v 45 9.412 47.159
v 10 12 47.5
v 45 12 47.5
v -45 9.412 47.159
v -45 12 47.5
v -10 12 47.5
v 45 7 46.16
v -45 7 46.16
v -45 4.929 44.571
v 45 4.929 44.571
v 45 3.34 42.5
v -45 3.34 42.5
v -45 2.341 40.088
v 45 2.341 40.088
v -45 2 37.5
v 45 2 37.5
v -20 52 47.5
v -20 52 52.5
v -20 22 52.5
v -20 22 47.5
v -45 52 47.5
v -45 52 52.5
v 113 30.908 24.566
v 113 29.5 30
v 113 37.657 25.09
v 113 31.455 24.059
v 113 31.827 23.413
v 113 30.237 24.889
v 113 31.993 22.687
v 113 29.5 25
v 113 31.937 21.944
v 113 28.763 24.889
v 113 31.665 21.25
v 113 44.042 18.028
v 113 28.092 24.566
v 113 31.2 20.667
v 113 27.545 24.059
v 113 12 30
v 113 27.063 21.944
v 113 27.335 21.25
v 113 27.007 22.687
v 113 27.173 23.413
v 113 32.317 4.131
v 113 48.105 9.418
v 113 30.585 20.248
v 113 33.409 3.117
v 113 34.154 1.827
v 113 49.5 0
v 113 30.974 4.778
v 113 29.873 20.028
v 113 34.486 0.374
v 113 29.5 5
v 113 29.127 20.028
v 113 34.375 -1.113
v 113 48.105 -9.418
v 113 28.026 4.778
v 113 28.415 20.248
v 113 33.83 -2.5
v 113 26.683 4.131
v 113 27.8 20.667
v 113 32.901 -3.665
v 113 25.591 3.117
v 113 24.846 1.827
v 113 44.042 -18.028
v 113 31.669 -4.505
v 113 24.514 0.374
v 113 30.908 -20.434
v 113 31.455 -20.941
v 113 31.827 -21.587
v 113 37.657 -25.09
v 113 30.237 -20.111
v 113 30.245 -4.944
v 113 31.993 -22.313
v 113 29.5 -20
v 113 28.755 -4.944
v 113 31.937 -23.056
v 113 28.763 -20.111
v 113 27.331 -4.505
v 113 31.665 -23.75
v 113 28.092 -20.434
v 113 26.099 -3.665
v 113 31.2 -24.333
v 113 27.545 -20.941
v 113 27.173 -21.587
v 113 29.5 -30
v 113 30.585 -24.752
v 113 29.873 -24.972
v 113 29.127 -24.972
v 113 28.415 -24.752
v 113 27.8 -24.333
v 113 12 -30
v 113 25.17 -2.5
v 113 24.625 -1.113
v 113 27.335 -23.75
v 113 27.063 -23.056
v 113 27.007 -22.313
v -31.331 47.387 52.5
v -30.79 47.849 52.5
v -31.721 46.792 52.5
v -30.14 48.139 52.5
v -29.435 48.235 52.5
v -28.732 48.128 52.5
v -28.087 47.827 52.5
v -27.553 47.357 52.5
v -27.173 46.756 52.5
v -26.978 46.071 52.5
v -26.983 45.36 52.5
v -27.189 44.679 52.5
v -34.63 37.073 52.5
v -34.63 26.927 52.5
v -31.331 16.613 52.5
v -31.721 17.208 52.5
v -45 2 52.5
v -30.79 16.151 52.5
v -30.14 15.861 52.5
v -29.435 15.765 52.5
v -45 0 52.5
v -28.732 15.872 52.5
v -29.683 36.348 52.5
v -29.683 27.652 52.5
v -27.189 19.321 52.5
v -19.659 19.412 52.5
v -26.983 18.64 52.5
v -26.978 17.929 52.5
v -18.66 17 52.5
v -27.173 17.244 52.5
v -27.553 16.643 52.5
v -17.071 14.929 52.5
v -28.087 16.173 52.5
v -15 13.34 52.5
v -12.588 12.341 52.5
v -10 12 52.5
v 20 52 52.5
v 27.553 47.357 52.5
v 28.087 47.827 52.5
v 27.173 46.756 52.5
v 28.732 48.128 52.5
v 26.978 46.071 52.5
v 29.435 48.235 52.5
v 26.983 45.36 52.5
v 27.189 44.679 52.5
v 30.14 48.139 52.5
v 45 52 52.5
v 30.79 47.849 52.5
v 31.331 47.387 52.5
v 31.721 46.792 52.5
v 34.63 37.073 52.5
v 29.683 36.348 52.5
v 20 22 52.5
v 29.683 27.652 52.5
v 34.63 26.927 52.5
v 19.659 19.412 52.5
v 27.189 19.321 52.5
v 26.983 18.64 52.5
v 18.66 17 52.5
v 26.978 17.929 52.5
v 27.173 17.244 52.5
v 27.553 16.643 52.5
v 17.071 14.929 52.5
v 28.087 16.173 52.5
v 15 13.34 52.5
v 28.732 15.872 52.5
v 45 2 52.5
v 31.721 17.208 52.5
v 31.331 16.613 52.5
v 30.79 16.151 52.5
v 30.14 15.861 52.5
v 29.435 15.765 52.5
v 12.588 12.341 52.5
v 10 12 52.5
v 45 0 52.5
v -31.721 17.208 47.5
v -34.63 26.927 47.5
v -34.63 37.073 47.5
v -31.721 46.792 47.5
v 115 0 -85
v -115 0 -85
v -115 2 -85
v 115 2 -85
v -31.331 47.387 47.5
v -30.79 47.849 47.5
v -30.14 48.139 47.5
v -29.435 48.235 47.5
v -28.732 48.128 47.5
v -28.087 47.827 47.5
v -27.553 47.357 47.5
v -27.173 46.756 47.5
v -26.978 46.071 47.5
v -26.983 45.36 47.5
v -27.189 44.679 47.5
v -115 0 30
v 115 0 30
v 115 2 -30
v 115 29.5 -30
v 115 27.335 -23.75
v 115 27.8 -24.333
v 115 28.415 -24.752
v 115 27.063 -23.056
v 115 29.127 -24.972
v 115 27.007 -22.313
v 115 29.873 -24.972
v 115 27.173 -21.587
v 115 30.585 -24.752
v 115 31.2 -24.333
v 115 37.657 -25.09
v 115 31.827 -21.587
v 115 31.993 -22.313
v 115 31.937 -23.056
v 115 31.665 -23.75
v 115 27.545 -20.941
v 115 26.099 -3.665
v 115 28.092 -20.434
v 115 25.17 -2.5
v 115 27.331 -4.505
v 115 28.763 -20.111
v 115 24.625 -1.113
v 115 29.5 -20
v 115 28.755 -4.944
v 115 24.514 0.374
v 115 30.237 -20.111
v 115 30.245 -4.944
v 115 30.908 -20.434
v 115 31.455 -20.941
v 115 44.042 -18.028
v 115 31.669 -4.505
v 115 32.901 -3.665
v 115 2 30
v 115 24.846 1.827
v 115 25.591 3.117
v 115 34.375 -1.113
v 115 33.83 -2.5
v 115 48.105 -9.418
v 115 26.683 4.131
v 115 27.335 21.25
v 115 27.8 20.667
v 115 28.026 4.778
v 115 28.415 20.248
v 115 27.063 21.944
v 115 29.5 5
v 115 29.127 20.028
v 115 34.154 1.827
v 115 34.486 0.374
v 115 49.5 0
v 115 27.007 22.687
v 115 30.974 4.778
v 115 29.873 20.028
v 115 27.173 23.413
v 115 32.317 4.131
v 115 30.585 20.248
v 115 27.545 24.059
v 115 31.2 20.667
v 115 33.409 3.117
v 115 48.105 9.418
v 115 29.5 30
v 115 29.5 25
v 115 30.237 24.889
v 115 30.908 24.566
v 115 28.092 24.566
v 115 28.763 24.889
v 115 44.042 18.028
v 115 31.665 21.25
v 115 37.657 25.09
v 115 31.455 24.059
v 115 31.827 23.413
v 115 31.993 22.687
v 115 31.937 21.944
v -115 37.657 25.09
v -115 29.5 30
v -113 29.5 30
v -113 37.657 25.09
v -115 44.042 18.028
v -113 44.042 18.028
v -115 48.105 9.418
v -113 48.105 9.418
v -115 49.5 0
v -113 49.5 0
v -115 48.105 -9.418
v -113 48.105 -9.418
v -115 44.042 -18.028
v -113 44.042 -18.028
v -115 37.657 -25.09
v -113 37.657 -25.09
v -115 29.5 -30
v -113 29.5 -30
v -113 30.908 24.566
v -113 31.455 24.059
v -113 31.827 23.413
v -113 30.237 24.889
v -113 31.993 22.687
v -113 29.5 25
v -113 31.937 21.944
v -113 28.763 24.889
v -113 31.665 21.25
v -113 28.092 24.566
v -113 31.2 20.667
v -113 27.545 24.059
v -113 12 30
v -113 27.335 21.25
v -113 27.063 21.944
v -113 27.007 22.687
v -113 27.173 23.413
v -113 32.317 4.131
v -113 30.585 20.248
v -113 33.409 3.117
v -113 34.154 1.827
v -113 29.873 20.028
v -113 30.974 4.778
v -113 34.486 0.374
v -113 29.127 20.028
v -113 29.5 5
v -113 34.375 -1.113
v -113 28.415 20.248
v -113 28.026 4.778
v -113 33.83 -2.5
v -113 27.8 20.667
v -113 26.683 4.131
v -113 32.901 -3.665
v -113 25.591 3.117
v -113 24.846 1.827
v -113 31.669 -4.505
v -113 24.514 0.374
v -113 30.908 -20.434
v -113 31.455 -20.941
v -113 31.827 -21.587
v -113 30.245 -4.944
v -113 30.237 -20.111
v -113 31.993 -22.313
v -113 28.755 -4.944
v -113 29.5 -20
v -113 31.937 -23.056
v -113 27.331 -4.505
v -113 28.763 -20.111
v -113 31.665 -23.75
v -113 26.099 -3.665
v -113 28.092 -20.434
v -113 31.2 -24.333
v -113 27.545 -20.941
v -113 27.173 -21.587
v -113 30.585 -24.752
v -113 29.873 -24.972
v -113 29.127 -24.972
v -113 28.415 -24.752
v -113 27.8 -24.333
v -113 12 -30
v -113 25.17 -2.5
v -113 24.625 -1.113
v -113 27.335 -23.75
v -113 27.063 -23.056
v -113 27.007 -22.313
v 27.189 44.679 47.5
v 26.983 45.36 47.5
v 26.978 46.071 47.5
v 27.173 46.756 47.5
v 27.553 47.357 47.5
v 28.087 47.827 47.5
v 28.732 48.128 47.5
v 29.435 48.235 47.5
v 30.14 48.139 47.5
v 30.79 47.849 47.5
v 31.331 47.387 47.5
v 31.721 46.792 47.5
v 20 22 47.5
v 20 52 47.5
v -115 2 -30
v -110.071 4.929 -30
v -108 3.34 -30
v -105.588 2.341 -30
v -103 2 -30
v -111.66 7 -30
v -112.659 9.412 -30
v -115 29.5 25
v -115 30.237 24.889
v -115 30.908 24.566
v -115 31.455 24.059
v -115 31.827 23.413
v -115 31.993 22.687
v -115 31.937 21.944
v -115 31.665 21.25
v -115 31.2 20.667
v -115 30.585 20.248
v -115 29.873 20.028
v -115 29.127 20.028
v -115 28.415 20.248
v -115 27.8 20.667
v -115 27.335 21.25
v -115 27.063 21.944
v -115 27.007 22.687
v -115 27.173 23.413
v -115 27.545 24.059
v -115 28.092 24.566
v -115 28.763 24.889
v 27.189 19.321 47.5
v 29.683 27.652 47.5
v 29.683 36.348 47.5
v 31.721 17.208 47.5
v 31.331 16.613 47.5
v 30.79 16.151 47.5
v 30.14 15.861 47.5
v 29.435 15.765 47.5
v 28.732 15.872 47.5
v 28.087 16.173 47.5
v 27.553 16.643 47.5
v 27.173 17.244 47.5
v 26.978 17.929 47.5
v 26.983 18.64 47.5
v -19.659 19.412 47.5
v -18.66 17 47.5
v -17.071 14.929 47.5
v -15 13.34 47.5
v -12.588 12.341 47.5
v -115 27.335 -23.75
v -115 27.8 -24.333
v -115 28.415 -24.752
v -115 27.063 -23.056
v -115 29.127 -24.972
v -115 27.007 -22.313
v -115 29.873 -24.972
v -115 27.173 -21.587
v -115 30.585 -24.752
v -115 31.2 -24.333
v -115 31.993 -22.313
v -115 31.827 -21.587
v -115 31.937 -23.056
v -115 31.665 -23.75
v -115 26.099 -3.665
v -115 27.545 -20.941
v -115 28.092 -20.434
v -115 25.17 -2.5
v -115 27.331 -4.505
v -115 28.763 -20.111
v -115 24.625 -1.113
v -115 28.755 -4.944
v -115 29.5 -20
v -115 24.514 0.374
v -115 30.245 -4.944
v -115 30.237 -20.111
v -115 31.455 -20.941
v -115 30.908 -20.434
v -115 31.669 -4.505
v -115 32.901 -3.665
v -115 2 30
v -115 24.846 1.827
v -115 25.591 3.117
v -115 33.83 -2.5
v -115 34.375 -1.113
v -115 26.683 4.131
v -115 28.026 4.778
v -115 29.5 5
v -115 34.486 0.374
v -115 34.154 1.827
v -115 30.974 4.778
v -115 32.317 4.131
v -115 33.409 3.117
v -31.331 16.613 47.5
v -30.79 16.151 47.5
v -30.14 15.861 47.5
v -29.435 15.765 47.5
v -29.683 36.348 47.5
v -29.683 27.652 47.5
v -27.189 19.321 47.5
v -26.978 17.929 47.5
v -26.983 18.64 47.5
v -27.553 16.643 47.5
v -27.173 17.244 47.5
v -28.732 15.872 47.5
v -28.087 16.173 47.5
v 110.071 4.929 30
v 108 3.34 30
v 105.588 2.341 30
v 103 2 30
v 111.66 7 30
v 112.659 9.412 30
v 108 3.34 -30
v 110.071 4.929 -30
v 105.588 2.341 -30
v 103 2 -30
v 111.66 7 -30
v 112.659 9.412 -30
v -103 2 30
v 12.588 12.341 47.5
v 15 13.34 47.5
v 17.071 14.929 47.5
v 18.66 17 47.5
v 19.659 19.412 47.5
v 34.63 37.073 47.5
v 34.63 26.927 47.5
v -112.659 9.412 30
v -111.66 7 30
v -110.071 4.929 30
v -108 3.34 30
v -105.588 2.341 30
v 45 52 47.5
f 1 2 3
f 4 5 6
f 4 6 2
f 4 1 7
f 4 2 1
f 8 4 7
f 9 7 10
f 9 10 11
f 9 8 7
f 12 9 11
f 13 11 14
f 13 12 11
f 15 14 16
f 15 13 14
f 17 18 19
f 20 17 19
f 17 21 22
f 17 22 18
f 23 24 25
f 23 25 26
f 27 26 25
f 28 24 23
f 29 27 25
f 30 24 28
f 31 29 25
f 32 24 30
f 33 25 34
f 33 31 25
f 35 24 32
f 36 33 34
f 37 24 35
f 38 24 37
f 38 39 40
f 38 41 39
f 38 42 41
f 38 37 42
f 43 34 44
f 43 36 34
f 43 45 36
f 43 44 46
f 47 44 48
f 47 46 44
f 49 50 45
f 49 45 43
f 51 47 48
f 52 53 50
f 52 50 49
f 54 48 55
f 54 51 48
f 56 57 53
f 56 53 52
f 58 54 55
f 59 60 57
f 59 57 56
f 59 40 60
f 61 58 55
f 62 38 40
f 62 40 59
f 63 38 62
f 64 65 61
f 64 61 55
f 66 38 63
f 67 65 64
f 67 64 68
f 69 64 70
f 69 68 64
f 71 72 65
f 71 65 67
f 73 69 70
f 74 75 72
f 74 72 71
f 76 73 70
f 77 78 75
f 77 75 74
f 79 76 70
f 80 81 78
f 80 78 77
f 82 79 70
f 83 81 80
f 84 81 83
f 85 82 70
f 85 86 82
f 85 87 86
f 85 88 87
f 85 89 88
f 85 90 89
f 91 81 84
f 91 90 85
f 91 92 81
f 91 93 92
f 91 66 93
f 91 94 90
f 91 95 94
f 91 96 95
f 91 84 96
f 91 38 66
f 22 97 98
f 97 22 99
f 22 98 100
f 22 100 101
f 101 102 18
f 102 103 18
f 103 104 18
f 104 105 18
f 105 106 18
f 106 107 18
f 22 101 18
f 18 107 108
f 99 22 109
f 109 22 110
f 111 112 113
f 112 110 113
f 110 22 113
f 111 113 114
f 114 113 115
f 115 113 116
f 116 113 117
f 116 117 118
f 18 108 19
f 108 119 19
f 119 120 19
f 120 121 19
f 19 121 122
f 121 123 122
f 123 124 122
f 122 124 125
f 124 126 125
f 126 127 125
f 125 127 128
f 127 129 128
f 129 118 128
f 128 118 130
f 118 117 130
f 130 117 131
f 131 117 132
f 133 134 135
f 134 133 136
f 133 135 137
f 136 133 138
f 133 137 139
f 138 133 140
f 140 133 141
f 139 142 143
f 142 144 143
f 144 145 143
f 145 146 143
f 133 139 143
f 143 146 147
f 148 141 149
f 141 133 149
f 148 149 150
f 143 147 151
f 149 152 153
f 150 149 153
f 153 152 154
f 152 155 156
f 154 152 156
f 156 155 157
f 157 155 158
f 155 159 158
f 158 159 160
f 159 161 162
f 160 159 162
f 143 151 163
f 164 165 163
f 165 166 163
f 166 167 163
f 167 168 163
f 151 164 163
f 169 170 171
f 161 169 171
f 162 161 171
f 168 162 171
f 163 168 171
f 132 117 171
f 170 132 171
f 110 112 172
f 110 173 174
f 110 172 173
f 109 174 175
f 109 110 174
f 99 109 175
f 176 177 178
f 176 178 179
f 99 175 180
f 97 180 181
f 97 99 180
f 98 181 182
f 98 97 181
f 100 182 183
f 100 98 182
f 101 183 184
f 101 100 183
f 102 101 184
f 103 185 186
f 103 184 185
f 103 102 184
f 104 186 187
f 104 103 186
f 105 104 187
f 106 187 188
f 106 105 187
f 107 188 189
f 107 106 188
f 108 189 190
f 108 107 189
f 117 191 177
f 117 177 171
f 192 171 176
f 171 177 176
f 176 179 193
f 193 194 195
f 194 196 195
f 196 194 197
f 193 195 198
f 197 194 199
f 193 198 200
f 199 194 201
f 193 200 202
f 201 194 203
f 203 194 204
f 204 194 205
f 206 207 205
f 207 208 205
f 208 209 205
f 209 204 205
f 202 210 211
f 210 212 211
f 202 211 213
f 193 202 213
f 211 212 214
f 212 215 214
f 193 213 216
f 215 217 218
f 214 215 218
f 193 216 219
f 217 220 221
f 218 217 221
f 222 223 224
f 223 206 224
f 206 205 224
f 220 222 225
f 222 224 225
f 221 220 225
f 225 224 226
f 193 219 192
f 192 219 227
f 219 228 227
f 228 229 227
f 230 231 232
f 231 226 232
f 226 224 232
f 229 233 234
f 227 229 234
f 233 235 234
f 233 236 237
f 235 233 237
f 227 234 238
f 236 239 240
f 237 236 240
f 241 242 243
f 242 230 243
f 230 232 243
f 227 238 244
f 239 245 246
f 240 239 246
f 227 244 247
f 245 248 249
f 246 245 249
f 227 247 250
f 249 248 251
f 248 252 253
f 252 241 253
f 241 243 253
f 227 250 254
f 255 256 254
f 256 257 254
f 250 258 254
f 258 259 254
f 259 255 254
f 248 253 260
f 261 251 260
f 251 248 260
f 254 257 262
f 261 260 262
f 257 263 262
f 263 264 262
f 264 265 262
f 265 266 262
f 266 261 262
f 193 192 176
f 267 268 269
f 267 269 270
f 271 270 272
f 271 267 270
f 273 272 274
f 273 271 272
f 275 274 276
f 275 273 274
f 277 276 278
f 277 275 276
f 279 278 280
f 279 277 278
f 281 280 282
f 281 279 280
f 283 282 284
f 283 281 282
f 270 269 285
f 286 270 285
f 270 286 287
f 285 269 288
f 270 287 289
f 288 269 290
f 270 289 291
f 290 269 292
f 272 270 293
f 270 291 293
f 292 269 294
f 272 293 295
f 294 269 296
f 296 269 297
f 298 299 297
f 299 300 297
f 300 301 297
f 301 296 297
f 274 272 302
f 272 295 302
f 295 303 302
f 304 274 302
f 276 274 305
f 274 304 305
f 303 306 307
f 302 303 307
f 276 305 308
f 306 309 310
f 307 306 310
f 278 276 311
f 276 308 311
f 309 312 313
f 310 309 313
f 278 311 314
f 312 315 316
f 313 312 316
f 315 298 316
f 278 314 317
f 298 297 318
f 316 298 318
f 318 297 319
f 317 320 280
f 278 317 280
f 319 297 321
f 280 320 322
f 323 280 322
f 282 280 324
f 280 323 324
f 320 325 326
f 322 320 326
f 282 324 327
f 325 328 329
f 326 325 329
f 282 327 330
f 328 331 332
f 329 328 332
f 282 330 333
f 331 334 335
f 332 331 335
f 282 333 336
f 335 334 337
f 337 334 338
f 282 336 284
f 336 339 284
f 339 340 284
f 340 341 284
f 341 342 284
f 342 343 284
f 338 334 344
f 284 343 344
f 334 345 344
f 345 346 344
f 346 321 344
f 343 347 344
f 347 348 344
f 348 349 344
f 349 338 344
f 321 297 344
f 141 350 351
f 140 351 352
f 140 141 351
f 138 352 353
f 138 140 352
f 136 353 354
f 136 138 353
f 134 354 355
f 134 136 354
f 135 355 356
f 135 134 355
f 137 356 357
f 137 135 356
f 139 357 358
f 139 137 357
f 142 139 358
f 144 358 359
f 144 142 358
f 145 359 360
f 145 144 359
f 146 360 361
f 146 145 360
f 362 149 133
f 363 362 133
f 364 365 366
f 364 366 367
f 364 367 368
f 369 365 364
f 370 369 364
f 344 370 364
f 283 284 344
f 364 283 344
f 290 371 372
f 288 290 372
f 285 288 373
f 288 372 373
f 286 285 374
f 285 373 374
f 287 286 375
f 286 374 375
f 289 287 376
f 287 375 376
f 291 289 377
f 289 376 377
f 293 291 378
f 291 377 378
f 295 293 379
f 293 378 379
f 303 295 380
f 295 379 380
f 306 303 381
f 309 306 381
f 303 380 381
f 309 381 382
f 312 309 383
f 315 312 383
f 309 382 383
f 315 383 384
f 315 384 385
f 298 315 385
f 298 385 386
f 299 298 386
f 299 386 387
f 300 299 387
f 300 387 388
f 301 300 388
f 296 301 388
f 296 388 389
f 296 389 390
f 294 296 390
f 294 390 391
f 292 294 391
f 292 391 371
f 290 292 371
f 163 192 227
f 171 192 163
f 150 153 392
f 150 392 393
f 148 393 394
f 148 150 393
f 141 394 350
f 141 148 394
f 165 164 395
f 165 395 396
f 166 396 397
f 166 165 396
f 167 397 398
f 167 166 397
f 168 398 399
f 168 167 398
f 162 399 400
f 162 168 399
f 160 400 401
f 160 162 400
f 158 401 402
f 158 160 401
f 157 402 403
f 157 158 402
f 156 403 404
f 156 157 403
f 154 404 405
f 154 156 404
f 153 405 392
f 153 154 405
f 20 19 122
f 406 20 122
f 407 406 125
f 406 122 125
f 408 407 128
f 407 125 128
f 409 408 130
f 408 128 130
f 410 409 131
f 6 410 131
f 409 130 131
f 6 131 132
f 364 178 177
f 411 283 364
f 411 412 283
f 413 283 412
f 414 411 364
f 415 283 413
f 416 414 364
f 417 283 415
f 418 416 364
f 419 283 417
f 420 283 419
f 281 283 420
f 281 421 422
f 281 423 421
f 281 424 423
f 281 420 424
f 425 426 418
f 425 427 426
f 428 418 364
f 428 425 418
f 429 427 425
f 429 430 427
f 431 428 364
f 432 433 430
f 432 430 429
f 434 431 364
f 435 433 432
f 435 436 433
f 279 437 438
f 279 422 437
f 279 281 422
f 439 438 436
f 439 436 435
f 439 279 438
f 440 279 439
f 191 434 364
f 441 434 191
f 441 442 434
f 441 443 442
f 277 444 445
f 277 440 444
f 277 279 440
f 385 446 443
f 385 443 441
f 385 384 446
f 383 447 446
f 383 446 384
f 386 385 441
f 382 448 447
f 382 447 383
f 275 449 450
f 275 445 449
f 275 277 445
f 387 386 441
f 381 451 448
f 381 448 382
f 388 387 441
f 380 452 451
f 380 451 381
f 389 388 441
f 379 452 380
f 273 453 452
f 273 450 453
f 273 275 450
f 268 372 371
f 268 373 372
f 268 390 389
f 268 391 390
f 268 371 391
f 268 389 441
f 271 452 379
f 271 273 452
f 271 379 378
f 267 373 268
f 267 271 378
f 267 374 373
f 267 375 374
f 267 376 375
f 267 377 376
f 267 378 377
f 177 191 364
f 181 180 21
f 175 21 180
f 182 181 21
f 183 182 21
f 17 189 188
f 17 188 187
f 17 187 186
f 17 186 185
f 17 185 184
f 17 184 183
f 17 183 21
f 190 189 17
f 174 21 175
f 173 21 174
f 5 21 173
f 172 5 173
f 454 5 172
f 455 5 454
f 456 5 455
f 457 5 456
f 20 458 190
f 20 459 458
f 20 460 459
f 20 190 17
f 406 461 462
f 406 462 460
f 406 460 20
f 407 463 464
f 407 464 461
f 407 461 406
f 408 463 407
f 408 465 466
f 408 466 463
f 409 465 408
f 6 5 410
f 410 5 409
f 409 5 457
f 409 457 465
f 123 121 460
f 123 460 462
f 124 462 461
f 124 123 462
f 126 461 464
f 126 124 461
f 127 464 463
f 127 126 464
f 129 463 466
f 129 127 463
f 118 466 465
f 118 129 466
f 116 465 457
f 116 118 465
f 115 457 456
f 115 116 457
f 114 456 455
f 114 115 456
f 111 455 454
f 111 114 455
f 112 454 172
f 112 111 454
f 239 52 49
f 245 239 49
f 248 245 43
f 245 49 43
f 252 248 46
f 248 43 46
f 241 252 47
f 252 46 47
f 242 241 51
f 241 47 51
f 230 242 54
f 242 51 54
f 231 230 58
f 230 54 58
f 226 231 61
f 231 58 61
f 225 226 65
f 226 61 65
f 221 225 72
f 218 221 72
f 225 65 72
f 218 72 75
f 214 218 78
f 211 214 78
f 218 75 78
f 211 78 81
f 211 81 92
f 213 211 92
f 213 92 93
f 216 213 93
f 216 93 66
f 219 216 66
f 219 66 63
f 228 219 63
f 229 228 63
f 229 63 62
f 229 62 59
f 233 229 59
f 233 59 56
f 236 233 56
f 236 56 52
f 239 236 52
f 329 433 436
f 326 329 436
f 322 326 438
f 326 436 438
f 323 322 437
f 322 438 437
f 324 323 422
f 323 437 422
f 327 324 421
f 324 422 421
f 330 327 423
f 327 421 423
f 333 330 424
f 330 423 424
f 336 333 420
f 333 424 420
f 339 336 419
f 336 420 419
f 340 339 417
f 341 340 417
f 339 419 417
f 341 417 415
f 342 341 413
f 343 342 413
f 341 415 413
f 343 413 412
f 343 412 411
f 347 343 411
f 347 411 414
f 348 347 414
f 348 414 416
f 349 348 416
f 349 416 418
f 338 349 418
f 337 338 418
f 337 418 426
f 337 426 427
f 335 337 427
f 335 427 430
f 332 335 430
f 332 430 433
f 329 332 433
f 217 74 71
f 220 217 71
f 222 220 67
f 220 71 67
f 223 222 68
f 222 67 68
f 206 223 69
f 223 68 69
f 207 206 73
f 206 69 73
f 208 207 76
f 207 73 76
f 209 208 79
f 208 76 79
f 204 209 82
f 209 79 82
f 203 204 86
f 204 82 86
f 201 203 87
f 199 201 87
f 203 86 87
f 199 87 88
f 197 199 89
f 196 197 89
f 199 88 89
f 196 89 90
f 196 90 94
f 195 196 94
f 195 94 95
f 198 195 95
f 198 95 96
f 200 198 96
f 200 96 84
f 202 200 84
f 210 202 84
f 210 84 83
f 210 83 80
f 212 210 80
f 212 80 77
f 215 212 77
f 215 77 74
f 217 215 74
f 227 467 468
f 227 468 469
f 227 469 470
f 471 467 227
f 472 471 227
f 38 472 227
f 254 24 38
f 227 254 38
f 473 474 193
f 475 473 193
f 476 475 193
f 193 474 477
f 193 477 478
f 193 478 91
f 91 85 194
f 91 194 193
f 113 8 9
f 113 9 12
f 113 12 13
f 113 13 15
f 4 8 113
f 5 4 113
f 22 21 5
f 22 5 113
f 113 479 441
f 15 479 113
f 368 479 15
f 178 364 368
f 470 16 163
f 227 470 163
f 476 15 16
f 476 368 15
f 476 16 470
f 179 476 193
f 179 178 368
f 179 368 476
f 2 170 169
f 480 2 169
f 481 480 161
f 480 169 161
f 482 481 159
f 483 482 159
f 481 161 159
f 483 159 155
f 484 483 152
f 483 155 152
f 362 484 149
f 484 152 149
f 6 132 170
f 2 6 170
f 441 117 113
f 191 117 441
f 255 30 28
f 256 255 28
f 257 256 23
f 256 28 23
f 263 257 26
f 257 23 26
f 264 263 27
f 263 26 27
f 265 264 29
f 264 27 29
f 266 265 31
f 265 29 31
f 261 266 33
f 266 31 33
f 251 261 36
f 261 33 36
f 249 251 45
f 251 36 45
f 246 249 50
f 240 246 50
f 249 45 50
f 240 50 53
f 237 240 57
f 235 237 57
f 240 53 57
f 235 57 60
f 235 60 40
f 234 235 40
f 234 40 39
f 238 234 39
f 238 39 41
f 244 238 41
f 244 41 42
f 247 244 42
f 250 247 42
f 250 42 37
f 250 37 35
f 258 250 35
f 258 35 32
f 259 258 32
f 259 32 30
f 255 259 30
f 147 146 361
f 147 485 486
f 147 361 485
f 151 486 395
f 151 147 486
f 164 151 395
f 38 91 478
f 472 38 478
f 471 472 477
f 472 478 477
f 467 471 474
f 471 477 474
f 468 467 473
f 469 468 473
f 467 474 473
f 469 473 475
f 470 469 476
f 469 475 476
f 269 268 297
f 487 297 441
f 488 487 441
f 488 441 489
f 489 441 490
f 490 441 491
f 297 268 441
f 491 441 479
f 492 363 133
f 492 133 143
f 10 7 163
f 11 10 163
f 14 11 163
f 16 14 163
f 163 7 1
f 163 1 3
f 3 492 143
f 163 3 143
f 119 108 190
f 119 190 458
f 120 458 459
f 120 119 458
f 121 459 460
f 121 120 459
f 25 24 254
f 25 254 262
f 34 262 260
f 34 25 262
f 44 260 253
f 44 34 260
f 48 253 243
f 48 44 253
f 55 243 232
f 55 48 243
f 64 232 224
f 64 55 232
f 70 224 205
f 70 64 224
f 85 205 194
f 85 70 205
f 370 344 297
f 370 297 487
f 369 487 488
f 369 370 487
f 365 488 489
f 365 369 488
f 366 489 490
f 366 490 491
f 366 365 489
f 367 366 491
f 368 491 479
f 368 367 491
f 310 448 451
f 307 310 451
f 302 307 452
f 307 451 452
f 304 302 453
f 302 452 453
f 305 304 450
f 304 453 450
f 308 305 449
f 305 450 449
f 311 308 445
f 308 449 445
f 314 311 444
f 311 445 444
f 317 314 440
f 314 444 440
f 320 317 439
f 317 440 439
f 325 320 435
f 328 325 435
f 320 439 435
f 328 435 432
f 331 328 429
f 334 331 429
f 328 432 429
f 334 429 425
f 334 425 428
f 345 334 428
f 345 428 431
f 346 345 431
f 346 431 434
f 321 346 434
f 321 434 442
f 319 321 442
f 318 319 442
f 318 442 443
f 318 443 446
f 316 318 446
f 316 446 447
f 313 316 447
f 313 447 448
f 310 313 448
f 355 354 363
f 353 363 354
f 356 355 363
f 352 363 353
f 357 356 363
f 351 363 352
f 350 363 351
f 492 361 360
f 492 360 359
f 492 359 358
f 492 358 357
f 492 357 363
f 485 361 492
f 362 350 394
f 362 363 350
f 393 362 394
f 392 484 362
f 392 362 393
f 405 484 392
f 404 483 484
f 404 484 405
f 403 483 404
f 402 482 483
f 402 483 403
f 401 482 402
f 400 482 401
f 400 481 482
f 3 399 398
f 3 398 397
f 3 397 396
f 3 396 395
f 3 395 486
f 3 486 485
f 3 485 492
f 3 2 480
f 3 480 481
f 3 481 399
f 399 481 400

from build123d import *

# Parameters (mm, degrees)
BOSS_EXTRUDE1_DEPTH      = 2
SKETCH2_W                = 2
SKETCH2_H                = 60
BOSS_EXTRUDE2_DEPTH      = 55
SKETCH3_R                = 5
CUT_EXTRUDE1_DEPTH       = 283
SKETCH4_R                = 2.5
CUT_EXTRUDE2_DEPTH       = 283
SKETCH9_W                = 230
SKETCH9_H                = 50
BOSS_EXTRUDE3_DEPTH      = 2
SKETCH13_W               = 230
SKETCH13_H               = 10
BOSS_EXTRUDE6_DEPTH      = 20
CUT_EXTRUDE9_START       = -230
CUT_EXTRUDE9_DEPTH       = 230
CUT_EXTRUDE14_DEPTH      = 180.947909129
CUT_EXTRUDE14_DEPTH_BACK = 180.947909129
BOSS_EXTRUDE8_DEPTH      = 60
SKETCH38_W               = 90
SKETCH38_H               = 5
BOSS_EXTRUDE9_DEPTH      = 50
CUT_EXTRUDE15_DEPTH      = 50
CUT_EXTRUDE16_DEPTH      = 152.492574075
CUT_EXTRUDE16_DEPTH_BACK = 152.492574075
BOSS_EXTRUDE10_DEPTH     = 90


# Read off the part's stored shape, not the designer's step: Cut-Extrude9
with BuildPart() as part:
    # Sketch1 → Boss-Extrude1 (new body)
    with BuildSketch(Plane(origin=(0, 0, 0), x_dir=(1, 0, 0), z_dir=(0, 1, 0))):
        Polygon((115, 50), (115, 80), (-115, 80), (-115, 50), (-115, -50), (-115, -75), (115, -75), (115, -50), align=None)
    extrude(amount=BOSS_EXTRUDE1_DEPTH)

    # Sketch2 → Boss-Extrude2 (add)
    with BuildSketch(Plane(origin=(0, 2, 0), x_dir=(1, 0, 0), z_dir=(0, 1, 0))):
        with Locations((-114, 0)):
            Rectangle(SKETCH2_W, SKETCH2_H)
        with Locations((114, 0)):
            Rectangle(SKETCH2_W, SKETCH2_H)
    extrude(amount=BOSS_EXTRUDE2_DEPTH)

    # Sketch3 → Cut-Extrude1 (cut)
    with BuildSketch(Plane.ZY.offset(115)):
        with Locations((0, 29.5)):
            Circle(SKETCH3_R)
    extrude(amount=-CUT_EXTRUDE1_DEPTH, mode=Mode.SUBTRACT)

    # Sketch4 → Cut-Extrude2 (cut)
    with BuildSketch(Plane.ZY.offset(115)):
        with Locations((-22.5, 29.5)):
            Circle(SKETCH4_R)
        with Locations((22.5, 29.5)):
            Circle(SKETCH4_R)
    extrude(amount=-CUT_EXTRUDE2_DEPTH, mode=Mode.SUBTRACT)

    # Sketch9 → Boss-Extrude3 (add)
    with BuildSketch(Plane(origin=(0, 2, 0), x_dir=(1, 0, 0), z_dir=(0, 1, 0))):
        with Locations((0, 105)):
            Rectangle(SKETCH9_W, SKETCH9_H)
    extrude(amount=-BOSS_EXTRUDE3_DEPTH)

    # Sketch13 → Boss-Extrude6 (add)
    with BuildSketch(Plane.XZ):
        with Locations((0, -125)):
            Rectangle(SKETCH13_W, SKETCH13_H)
    extrude(amount=BOSS_EXTRUDE6_DEPTH)

    # Cut-Extrude9 outline → Cut-Extrude9 (cut)
    with BuildSketch(Plane(origin=(115, 0, 0), x_dir=(0, 0, -1), z_dir=(1, 0, 0)).offset(CUT_EXTRUDE9_START)):
        with BuildLine():
            Line((-30, 57), (-30, 29.5))
            ThreePointArc((-30, 29.5), (0, 49.5), (30, 29.5))
            Line((30, 29.5), (30, 57))
            Line((30, 57), (-30, 57))
        make_face()
    extrude(amount=CUT_EXTRUDE9_DEPTH, mode=Mode.SUBTRACT)

    # Sketch34 → Cut-Extrude14 (cut, two sides: drawn at the far end of the back side and taken through both)
    with BuildSketch(Plane(origin=(0, 2, 0), x_dir=(1, 0, 0), z_dir=(0, 1, 0)).offset(-CUT_EXTRUDE14_DEPTH_BACK)):
        Polygon((685.357029045, 85), (115, 85), (-115, 85), (-685.357029045, 85), (-685.357029045, 1225.71405809), (685.357029045, 1225.71405809), align=None)
    extrude(amount=CUT_EXTRUDE14_DEPTH + CUT_EXTRUDE14_DEPTH_BACK, mode=Mode.SUBTRACT)

    # Sketch37 → Boss-Extrude8 (add)
    with BuildSketch(Plane(origin=(0, 0, -30), x_dir=(-1, 0, 0), z_dir=(0, 0, -1))):
        with BuildLine():
            Line((-103, 2), (-113, 2))
            Line((-113, 2), (-113, 12))
            ThreePointArc((-113, 12), (-110.071067812, 4.928932188), (-103, 2))
        make_face()
        with BuildLine():
            Line((103, 2), (113, 2))
            Line((113, 2), (113, 12))
            ThreePointArc((113, 12), (110.071067812, 4.928932188), (103, 2))
        make_face()
    extrude(amount=-BOSS_EXTRUDE8_DEPTH)

    # Sketch38 → Boss-Extrude9 (add)
    with BuildSketch(Plane(origin=(0, 2, 0), x_dir=(1, 0, 0), z_dir=(0, 1, 0))):
        with Locations((0, -50)):
            Rectangle(SKETCH38_W, SKETCH38_H)
    extrude(amount=BOSS_EXTRUDE9_DEPTH)

    # Sketch39 → Cut-Extrude15 (cut)
    with BuildSketch(Plane.XY.offset(52.5)):
        with BuildLine():
            Line((0, 52), (-20, 52))
            Line((-20, 52), (-20, 22))
            ThreePointArc((-20, 22), (-17.071067812, 14.928932188), (-10, 12))
            Line((-10, 12), (10, 12))
            ThreePointArc((10, 12), (17.071067812, 14.928932188), (20, 22))
            Line((20, 22), (20, 52))
            Line((20, 52), (0, 52))
        make_face()
        with BuildLine():
            ThreePointArc((27.189233611, 19.321452148), (30, 32), (27.189233611, 44.678547852))
            ThreePointArc((27.189233611, 44.678547852), (28.398457424, 48.000862974), (31.720772546, 46.791639161))
            ThreePointArc((31.720772546, 46.791639161), (35, 32), (31.720772546, 17.208360839))
            ThreePointArc((31.720772546, 17.208360839), (28.398457424, 15.999137026), (27.189233611, 19.321452148))
        make_face()
        with BuildLine():
            ThreePointArc((-27.189233611, 19.321452148), (-28.398457424, 15.999137026), (-31.720772546, 17.208360839))
            ThreePointArc((-31.720772546, 17.208360839), (-35, 32), (-31.720772546, 46.791639161))
            ThreePointArc((-31.720772546, 46.791639161), (-28.398457424, 48.000862974), (-27.189233611, 44.678547852))
            ThreePointArc((-27.189233611, 44.678547852), (-30, 32), (-27.189233611, 19.321452148))
        make_face()
    extrude(amount=-CUT_EXTRUDE15_DEPTH, mode=Mode.SUBTRACT)

    # Sketch40 → Cut-Extrude16 (cut, two sides: drawn at the far end of the back side and taken through both)
    with BuildSketch(Plane(origin=(0, 2, 0), x_dir=(1, 0, 0), z_dir=(0, 1, 0)).offset(-CUT_EXTRUDE16_DEPTH_BACK)):
        Polygon((-614.144418911, 130.439277507), (-115, -30), (-45, -52.5), (45, -52.5), (115, -30), (614.144418911, 130.439277507), (614.144418911, -918.151992143), (-614.144418911, -918.151992143), align=None)
    extrude(amount=CUT_EXTRUDE16_DEPTH + CUT_EXTRUDE16_DEPTH_BACK, mode=Mode.SUBTRACT)

    # Sketch41 → Boss-Extrude10 (add)
    with BuildSketch(Plane.ZY.offset(45)):
        with BuildLine():
            Line((37.5, 2), (47.5, 2))
            Line((47.5, 2), (47.5, 12))
            ThreePointArc((47.5, 12), (44.571067812, 4.928932188), (37.5, 2))
        make_face()
    extrude(amount=-BOSS_EXTRUDE10_DEPTH)


solid = part.part
